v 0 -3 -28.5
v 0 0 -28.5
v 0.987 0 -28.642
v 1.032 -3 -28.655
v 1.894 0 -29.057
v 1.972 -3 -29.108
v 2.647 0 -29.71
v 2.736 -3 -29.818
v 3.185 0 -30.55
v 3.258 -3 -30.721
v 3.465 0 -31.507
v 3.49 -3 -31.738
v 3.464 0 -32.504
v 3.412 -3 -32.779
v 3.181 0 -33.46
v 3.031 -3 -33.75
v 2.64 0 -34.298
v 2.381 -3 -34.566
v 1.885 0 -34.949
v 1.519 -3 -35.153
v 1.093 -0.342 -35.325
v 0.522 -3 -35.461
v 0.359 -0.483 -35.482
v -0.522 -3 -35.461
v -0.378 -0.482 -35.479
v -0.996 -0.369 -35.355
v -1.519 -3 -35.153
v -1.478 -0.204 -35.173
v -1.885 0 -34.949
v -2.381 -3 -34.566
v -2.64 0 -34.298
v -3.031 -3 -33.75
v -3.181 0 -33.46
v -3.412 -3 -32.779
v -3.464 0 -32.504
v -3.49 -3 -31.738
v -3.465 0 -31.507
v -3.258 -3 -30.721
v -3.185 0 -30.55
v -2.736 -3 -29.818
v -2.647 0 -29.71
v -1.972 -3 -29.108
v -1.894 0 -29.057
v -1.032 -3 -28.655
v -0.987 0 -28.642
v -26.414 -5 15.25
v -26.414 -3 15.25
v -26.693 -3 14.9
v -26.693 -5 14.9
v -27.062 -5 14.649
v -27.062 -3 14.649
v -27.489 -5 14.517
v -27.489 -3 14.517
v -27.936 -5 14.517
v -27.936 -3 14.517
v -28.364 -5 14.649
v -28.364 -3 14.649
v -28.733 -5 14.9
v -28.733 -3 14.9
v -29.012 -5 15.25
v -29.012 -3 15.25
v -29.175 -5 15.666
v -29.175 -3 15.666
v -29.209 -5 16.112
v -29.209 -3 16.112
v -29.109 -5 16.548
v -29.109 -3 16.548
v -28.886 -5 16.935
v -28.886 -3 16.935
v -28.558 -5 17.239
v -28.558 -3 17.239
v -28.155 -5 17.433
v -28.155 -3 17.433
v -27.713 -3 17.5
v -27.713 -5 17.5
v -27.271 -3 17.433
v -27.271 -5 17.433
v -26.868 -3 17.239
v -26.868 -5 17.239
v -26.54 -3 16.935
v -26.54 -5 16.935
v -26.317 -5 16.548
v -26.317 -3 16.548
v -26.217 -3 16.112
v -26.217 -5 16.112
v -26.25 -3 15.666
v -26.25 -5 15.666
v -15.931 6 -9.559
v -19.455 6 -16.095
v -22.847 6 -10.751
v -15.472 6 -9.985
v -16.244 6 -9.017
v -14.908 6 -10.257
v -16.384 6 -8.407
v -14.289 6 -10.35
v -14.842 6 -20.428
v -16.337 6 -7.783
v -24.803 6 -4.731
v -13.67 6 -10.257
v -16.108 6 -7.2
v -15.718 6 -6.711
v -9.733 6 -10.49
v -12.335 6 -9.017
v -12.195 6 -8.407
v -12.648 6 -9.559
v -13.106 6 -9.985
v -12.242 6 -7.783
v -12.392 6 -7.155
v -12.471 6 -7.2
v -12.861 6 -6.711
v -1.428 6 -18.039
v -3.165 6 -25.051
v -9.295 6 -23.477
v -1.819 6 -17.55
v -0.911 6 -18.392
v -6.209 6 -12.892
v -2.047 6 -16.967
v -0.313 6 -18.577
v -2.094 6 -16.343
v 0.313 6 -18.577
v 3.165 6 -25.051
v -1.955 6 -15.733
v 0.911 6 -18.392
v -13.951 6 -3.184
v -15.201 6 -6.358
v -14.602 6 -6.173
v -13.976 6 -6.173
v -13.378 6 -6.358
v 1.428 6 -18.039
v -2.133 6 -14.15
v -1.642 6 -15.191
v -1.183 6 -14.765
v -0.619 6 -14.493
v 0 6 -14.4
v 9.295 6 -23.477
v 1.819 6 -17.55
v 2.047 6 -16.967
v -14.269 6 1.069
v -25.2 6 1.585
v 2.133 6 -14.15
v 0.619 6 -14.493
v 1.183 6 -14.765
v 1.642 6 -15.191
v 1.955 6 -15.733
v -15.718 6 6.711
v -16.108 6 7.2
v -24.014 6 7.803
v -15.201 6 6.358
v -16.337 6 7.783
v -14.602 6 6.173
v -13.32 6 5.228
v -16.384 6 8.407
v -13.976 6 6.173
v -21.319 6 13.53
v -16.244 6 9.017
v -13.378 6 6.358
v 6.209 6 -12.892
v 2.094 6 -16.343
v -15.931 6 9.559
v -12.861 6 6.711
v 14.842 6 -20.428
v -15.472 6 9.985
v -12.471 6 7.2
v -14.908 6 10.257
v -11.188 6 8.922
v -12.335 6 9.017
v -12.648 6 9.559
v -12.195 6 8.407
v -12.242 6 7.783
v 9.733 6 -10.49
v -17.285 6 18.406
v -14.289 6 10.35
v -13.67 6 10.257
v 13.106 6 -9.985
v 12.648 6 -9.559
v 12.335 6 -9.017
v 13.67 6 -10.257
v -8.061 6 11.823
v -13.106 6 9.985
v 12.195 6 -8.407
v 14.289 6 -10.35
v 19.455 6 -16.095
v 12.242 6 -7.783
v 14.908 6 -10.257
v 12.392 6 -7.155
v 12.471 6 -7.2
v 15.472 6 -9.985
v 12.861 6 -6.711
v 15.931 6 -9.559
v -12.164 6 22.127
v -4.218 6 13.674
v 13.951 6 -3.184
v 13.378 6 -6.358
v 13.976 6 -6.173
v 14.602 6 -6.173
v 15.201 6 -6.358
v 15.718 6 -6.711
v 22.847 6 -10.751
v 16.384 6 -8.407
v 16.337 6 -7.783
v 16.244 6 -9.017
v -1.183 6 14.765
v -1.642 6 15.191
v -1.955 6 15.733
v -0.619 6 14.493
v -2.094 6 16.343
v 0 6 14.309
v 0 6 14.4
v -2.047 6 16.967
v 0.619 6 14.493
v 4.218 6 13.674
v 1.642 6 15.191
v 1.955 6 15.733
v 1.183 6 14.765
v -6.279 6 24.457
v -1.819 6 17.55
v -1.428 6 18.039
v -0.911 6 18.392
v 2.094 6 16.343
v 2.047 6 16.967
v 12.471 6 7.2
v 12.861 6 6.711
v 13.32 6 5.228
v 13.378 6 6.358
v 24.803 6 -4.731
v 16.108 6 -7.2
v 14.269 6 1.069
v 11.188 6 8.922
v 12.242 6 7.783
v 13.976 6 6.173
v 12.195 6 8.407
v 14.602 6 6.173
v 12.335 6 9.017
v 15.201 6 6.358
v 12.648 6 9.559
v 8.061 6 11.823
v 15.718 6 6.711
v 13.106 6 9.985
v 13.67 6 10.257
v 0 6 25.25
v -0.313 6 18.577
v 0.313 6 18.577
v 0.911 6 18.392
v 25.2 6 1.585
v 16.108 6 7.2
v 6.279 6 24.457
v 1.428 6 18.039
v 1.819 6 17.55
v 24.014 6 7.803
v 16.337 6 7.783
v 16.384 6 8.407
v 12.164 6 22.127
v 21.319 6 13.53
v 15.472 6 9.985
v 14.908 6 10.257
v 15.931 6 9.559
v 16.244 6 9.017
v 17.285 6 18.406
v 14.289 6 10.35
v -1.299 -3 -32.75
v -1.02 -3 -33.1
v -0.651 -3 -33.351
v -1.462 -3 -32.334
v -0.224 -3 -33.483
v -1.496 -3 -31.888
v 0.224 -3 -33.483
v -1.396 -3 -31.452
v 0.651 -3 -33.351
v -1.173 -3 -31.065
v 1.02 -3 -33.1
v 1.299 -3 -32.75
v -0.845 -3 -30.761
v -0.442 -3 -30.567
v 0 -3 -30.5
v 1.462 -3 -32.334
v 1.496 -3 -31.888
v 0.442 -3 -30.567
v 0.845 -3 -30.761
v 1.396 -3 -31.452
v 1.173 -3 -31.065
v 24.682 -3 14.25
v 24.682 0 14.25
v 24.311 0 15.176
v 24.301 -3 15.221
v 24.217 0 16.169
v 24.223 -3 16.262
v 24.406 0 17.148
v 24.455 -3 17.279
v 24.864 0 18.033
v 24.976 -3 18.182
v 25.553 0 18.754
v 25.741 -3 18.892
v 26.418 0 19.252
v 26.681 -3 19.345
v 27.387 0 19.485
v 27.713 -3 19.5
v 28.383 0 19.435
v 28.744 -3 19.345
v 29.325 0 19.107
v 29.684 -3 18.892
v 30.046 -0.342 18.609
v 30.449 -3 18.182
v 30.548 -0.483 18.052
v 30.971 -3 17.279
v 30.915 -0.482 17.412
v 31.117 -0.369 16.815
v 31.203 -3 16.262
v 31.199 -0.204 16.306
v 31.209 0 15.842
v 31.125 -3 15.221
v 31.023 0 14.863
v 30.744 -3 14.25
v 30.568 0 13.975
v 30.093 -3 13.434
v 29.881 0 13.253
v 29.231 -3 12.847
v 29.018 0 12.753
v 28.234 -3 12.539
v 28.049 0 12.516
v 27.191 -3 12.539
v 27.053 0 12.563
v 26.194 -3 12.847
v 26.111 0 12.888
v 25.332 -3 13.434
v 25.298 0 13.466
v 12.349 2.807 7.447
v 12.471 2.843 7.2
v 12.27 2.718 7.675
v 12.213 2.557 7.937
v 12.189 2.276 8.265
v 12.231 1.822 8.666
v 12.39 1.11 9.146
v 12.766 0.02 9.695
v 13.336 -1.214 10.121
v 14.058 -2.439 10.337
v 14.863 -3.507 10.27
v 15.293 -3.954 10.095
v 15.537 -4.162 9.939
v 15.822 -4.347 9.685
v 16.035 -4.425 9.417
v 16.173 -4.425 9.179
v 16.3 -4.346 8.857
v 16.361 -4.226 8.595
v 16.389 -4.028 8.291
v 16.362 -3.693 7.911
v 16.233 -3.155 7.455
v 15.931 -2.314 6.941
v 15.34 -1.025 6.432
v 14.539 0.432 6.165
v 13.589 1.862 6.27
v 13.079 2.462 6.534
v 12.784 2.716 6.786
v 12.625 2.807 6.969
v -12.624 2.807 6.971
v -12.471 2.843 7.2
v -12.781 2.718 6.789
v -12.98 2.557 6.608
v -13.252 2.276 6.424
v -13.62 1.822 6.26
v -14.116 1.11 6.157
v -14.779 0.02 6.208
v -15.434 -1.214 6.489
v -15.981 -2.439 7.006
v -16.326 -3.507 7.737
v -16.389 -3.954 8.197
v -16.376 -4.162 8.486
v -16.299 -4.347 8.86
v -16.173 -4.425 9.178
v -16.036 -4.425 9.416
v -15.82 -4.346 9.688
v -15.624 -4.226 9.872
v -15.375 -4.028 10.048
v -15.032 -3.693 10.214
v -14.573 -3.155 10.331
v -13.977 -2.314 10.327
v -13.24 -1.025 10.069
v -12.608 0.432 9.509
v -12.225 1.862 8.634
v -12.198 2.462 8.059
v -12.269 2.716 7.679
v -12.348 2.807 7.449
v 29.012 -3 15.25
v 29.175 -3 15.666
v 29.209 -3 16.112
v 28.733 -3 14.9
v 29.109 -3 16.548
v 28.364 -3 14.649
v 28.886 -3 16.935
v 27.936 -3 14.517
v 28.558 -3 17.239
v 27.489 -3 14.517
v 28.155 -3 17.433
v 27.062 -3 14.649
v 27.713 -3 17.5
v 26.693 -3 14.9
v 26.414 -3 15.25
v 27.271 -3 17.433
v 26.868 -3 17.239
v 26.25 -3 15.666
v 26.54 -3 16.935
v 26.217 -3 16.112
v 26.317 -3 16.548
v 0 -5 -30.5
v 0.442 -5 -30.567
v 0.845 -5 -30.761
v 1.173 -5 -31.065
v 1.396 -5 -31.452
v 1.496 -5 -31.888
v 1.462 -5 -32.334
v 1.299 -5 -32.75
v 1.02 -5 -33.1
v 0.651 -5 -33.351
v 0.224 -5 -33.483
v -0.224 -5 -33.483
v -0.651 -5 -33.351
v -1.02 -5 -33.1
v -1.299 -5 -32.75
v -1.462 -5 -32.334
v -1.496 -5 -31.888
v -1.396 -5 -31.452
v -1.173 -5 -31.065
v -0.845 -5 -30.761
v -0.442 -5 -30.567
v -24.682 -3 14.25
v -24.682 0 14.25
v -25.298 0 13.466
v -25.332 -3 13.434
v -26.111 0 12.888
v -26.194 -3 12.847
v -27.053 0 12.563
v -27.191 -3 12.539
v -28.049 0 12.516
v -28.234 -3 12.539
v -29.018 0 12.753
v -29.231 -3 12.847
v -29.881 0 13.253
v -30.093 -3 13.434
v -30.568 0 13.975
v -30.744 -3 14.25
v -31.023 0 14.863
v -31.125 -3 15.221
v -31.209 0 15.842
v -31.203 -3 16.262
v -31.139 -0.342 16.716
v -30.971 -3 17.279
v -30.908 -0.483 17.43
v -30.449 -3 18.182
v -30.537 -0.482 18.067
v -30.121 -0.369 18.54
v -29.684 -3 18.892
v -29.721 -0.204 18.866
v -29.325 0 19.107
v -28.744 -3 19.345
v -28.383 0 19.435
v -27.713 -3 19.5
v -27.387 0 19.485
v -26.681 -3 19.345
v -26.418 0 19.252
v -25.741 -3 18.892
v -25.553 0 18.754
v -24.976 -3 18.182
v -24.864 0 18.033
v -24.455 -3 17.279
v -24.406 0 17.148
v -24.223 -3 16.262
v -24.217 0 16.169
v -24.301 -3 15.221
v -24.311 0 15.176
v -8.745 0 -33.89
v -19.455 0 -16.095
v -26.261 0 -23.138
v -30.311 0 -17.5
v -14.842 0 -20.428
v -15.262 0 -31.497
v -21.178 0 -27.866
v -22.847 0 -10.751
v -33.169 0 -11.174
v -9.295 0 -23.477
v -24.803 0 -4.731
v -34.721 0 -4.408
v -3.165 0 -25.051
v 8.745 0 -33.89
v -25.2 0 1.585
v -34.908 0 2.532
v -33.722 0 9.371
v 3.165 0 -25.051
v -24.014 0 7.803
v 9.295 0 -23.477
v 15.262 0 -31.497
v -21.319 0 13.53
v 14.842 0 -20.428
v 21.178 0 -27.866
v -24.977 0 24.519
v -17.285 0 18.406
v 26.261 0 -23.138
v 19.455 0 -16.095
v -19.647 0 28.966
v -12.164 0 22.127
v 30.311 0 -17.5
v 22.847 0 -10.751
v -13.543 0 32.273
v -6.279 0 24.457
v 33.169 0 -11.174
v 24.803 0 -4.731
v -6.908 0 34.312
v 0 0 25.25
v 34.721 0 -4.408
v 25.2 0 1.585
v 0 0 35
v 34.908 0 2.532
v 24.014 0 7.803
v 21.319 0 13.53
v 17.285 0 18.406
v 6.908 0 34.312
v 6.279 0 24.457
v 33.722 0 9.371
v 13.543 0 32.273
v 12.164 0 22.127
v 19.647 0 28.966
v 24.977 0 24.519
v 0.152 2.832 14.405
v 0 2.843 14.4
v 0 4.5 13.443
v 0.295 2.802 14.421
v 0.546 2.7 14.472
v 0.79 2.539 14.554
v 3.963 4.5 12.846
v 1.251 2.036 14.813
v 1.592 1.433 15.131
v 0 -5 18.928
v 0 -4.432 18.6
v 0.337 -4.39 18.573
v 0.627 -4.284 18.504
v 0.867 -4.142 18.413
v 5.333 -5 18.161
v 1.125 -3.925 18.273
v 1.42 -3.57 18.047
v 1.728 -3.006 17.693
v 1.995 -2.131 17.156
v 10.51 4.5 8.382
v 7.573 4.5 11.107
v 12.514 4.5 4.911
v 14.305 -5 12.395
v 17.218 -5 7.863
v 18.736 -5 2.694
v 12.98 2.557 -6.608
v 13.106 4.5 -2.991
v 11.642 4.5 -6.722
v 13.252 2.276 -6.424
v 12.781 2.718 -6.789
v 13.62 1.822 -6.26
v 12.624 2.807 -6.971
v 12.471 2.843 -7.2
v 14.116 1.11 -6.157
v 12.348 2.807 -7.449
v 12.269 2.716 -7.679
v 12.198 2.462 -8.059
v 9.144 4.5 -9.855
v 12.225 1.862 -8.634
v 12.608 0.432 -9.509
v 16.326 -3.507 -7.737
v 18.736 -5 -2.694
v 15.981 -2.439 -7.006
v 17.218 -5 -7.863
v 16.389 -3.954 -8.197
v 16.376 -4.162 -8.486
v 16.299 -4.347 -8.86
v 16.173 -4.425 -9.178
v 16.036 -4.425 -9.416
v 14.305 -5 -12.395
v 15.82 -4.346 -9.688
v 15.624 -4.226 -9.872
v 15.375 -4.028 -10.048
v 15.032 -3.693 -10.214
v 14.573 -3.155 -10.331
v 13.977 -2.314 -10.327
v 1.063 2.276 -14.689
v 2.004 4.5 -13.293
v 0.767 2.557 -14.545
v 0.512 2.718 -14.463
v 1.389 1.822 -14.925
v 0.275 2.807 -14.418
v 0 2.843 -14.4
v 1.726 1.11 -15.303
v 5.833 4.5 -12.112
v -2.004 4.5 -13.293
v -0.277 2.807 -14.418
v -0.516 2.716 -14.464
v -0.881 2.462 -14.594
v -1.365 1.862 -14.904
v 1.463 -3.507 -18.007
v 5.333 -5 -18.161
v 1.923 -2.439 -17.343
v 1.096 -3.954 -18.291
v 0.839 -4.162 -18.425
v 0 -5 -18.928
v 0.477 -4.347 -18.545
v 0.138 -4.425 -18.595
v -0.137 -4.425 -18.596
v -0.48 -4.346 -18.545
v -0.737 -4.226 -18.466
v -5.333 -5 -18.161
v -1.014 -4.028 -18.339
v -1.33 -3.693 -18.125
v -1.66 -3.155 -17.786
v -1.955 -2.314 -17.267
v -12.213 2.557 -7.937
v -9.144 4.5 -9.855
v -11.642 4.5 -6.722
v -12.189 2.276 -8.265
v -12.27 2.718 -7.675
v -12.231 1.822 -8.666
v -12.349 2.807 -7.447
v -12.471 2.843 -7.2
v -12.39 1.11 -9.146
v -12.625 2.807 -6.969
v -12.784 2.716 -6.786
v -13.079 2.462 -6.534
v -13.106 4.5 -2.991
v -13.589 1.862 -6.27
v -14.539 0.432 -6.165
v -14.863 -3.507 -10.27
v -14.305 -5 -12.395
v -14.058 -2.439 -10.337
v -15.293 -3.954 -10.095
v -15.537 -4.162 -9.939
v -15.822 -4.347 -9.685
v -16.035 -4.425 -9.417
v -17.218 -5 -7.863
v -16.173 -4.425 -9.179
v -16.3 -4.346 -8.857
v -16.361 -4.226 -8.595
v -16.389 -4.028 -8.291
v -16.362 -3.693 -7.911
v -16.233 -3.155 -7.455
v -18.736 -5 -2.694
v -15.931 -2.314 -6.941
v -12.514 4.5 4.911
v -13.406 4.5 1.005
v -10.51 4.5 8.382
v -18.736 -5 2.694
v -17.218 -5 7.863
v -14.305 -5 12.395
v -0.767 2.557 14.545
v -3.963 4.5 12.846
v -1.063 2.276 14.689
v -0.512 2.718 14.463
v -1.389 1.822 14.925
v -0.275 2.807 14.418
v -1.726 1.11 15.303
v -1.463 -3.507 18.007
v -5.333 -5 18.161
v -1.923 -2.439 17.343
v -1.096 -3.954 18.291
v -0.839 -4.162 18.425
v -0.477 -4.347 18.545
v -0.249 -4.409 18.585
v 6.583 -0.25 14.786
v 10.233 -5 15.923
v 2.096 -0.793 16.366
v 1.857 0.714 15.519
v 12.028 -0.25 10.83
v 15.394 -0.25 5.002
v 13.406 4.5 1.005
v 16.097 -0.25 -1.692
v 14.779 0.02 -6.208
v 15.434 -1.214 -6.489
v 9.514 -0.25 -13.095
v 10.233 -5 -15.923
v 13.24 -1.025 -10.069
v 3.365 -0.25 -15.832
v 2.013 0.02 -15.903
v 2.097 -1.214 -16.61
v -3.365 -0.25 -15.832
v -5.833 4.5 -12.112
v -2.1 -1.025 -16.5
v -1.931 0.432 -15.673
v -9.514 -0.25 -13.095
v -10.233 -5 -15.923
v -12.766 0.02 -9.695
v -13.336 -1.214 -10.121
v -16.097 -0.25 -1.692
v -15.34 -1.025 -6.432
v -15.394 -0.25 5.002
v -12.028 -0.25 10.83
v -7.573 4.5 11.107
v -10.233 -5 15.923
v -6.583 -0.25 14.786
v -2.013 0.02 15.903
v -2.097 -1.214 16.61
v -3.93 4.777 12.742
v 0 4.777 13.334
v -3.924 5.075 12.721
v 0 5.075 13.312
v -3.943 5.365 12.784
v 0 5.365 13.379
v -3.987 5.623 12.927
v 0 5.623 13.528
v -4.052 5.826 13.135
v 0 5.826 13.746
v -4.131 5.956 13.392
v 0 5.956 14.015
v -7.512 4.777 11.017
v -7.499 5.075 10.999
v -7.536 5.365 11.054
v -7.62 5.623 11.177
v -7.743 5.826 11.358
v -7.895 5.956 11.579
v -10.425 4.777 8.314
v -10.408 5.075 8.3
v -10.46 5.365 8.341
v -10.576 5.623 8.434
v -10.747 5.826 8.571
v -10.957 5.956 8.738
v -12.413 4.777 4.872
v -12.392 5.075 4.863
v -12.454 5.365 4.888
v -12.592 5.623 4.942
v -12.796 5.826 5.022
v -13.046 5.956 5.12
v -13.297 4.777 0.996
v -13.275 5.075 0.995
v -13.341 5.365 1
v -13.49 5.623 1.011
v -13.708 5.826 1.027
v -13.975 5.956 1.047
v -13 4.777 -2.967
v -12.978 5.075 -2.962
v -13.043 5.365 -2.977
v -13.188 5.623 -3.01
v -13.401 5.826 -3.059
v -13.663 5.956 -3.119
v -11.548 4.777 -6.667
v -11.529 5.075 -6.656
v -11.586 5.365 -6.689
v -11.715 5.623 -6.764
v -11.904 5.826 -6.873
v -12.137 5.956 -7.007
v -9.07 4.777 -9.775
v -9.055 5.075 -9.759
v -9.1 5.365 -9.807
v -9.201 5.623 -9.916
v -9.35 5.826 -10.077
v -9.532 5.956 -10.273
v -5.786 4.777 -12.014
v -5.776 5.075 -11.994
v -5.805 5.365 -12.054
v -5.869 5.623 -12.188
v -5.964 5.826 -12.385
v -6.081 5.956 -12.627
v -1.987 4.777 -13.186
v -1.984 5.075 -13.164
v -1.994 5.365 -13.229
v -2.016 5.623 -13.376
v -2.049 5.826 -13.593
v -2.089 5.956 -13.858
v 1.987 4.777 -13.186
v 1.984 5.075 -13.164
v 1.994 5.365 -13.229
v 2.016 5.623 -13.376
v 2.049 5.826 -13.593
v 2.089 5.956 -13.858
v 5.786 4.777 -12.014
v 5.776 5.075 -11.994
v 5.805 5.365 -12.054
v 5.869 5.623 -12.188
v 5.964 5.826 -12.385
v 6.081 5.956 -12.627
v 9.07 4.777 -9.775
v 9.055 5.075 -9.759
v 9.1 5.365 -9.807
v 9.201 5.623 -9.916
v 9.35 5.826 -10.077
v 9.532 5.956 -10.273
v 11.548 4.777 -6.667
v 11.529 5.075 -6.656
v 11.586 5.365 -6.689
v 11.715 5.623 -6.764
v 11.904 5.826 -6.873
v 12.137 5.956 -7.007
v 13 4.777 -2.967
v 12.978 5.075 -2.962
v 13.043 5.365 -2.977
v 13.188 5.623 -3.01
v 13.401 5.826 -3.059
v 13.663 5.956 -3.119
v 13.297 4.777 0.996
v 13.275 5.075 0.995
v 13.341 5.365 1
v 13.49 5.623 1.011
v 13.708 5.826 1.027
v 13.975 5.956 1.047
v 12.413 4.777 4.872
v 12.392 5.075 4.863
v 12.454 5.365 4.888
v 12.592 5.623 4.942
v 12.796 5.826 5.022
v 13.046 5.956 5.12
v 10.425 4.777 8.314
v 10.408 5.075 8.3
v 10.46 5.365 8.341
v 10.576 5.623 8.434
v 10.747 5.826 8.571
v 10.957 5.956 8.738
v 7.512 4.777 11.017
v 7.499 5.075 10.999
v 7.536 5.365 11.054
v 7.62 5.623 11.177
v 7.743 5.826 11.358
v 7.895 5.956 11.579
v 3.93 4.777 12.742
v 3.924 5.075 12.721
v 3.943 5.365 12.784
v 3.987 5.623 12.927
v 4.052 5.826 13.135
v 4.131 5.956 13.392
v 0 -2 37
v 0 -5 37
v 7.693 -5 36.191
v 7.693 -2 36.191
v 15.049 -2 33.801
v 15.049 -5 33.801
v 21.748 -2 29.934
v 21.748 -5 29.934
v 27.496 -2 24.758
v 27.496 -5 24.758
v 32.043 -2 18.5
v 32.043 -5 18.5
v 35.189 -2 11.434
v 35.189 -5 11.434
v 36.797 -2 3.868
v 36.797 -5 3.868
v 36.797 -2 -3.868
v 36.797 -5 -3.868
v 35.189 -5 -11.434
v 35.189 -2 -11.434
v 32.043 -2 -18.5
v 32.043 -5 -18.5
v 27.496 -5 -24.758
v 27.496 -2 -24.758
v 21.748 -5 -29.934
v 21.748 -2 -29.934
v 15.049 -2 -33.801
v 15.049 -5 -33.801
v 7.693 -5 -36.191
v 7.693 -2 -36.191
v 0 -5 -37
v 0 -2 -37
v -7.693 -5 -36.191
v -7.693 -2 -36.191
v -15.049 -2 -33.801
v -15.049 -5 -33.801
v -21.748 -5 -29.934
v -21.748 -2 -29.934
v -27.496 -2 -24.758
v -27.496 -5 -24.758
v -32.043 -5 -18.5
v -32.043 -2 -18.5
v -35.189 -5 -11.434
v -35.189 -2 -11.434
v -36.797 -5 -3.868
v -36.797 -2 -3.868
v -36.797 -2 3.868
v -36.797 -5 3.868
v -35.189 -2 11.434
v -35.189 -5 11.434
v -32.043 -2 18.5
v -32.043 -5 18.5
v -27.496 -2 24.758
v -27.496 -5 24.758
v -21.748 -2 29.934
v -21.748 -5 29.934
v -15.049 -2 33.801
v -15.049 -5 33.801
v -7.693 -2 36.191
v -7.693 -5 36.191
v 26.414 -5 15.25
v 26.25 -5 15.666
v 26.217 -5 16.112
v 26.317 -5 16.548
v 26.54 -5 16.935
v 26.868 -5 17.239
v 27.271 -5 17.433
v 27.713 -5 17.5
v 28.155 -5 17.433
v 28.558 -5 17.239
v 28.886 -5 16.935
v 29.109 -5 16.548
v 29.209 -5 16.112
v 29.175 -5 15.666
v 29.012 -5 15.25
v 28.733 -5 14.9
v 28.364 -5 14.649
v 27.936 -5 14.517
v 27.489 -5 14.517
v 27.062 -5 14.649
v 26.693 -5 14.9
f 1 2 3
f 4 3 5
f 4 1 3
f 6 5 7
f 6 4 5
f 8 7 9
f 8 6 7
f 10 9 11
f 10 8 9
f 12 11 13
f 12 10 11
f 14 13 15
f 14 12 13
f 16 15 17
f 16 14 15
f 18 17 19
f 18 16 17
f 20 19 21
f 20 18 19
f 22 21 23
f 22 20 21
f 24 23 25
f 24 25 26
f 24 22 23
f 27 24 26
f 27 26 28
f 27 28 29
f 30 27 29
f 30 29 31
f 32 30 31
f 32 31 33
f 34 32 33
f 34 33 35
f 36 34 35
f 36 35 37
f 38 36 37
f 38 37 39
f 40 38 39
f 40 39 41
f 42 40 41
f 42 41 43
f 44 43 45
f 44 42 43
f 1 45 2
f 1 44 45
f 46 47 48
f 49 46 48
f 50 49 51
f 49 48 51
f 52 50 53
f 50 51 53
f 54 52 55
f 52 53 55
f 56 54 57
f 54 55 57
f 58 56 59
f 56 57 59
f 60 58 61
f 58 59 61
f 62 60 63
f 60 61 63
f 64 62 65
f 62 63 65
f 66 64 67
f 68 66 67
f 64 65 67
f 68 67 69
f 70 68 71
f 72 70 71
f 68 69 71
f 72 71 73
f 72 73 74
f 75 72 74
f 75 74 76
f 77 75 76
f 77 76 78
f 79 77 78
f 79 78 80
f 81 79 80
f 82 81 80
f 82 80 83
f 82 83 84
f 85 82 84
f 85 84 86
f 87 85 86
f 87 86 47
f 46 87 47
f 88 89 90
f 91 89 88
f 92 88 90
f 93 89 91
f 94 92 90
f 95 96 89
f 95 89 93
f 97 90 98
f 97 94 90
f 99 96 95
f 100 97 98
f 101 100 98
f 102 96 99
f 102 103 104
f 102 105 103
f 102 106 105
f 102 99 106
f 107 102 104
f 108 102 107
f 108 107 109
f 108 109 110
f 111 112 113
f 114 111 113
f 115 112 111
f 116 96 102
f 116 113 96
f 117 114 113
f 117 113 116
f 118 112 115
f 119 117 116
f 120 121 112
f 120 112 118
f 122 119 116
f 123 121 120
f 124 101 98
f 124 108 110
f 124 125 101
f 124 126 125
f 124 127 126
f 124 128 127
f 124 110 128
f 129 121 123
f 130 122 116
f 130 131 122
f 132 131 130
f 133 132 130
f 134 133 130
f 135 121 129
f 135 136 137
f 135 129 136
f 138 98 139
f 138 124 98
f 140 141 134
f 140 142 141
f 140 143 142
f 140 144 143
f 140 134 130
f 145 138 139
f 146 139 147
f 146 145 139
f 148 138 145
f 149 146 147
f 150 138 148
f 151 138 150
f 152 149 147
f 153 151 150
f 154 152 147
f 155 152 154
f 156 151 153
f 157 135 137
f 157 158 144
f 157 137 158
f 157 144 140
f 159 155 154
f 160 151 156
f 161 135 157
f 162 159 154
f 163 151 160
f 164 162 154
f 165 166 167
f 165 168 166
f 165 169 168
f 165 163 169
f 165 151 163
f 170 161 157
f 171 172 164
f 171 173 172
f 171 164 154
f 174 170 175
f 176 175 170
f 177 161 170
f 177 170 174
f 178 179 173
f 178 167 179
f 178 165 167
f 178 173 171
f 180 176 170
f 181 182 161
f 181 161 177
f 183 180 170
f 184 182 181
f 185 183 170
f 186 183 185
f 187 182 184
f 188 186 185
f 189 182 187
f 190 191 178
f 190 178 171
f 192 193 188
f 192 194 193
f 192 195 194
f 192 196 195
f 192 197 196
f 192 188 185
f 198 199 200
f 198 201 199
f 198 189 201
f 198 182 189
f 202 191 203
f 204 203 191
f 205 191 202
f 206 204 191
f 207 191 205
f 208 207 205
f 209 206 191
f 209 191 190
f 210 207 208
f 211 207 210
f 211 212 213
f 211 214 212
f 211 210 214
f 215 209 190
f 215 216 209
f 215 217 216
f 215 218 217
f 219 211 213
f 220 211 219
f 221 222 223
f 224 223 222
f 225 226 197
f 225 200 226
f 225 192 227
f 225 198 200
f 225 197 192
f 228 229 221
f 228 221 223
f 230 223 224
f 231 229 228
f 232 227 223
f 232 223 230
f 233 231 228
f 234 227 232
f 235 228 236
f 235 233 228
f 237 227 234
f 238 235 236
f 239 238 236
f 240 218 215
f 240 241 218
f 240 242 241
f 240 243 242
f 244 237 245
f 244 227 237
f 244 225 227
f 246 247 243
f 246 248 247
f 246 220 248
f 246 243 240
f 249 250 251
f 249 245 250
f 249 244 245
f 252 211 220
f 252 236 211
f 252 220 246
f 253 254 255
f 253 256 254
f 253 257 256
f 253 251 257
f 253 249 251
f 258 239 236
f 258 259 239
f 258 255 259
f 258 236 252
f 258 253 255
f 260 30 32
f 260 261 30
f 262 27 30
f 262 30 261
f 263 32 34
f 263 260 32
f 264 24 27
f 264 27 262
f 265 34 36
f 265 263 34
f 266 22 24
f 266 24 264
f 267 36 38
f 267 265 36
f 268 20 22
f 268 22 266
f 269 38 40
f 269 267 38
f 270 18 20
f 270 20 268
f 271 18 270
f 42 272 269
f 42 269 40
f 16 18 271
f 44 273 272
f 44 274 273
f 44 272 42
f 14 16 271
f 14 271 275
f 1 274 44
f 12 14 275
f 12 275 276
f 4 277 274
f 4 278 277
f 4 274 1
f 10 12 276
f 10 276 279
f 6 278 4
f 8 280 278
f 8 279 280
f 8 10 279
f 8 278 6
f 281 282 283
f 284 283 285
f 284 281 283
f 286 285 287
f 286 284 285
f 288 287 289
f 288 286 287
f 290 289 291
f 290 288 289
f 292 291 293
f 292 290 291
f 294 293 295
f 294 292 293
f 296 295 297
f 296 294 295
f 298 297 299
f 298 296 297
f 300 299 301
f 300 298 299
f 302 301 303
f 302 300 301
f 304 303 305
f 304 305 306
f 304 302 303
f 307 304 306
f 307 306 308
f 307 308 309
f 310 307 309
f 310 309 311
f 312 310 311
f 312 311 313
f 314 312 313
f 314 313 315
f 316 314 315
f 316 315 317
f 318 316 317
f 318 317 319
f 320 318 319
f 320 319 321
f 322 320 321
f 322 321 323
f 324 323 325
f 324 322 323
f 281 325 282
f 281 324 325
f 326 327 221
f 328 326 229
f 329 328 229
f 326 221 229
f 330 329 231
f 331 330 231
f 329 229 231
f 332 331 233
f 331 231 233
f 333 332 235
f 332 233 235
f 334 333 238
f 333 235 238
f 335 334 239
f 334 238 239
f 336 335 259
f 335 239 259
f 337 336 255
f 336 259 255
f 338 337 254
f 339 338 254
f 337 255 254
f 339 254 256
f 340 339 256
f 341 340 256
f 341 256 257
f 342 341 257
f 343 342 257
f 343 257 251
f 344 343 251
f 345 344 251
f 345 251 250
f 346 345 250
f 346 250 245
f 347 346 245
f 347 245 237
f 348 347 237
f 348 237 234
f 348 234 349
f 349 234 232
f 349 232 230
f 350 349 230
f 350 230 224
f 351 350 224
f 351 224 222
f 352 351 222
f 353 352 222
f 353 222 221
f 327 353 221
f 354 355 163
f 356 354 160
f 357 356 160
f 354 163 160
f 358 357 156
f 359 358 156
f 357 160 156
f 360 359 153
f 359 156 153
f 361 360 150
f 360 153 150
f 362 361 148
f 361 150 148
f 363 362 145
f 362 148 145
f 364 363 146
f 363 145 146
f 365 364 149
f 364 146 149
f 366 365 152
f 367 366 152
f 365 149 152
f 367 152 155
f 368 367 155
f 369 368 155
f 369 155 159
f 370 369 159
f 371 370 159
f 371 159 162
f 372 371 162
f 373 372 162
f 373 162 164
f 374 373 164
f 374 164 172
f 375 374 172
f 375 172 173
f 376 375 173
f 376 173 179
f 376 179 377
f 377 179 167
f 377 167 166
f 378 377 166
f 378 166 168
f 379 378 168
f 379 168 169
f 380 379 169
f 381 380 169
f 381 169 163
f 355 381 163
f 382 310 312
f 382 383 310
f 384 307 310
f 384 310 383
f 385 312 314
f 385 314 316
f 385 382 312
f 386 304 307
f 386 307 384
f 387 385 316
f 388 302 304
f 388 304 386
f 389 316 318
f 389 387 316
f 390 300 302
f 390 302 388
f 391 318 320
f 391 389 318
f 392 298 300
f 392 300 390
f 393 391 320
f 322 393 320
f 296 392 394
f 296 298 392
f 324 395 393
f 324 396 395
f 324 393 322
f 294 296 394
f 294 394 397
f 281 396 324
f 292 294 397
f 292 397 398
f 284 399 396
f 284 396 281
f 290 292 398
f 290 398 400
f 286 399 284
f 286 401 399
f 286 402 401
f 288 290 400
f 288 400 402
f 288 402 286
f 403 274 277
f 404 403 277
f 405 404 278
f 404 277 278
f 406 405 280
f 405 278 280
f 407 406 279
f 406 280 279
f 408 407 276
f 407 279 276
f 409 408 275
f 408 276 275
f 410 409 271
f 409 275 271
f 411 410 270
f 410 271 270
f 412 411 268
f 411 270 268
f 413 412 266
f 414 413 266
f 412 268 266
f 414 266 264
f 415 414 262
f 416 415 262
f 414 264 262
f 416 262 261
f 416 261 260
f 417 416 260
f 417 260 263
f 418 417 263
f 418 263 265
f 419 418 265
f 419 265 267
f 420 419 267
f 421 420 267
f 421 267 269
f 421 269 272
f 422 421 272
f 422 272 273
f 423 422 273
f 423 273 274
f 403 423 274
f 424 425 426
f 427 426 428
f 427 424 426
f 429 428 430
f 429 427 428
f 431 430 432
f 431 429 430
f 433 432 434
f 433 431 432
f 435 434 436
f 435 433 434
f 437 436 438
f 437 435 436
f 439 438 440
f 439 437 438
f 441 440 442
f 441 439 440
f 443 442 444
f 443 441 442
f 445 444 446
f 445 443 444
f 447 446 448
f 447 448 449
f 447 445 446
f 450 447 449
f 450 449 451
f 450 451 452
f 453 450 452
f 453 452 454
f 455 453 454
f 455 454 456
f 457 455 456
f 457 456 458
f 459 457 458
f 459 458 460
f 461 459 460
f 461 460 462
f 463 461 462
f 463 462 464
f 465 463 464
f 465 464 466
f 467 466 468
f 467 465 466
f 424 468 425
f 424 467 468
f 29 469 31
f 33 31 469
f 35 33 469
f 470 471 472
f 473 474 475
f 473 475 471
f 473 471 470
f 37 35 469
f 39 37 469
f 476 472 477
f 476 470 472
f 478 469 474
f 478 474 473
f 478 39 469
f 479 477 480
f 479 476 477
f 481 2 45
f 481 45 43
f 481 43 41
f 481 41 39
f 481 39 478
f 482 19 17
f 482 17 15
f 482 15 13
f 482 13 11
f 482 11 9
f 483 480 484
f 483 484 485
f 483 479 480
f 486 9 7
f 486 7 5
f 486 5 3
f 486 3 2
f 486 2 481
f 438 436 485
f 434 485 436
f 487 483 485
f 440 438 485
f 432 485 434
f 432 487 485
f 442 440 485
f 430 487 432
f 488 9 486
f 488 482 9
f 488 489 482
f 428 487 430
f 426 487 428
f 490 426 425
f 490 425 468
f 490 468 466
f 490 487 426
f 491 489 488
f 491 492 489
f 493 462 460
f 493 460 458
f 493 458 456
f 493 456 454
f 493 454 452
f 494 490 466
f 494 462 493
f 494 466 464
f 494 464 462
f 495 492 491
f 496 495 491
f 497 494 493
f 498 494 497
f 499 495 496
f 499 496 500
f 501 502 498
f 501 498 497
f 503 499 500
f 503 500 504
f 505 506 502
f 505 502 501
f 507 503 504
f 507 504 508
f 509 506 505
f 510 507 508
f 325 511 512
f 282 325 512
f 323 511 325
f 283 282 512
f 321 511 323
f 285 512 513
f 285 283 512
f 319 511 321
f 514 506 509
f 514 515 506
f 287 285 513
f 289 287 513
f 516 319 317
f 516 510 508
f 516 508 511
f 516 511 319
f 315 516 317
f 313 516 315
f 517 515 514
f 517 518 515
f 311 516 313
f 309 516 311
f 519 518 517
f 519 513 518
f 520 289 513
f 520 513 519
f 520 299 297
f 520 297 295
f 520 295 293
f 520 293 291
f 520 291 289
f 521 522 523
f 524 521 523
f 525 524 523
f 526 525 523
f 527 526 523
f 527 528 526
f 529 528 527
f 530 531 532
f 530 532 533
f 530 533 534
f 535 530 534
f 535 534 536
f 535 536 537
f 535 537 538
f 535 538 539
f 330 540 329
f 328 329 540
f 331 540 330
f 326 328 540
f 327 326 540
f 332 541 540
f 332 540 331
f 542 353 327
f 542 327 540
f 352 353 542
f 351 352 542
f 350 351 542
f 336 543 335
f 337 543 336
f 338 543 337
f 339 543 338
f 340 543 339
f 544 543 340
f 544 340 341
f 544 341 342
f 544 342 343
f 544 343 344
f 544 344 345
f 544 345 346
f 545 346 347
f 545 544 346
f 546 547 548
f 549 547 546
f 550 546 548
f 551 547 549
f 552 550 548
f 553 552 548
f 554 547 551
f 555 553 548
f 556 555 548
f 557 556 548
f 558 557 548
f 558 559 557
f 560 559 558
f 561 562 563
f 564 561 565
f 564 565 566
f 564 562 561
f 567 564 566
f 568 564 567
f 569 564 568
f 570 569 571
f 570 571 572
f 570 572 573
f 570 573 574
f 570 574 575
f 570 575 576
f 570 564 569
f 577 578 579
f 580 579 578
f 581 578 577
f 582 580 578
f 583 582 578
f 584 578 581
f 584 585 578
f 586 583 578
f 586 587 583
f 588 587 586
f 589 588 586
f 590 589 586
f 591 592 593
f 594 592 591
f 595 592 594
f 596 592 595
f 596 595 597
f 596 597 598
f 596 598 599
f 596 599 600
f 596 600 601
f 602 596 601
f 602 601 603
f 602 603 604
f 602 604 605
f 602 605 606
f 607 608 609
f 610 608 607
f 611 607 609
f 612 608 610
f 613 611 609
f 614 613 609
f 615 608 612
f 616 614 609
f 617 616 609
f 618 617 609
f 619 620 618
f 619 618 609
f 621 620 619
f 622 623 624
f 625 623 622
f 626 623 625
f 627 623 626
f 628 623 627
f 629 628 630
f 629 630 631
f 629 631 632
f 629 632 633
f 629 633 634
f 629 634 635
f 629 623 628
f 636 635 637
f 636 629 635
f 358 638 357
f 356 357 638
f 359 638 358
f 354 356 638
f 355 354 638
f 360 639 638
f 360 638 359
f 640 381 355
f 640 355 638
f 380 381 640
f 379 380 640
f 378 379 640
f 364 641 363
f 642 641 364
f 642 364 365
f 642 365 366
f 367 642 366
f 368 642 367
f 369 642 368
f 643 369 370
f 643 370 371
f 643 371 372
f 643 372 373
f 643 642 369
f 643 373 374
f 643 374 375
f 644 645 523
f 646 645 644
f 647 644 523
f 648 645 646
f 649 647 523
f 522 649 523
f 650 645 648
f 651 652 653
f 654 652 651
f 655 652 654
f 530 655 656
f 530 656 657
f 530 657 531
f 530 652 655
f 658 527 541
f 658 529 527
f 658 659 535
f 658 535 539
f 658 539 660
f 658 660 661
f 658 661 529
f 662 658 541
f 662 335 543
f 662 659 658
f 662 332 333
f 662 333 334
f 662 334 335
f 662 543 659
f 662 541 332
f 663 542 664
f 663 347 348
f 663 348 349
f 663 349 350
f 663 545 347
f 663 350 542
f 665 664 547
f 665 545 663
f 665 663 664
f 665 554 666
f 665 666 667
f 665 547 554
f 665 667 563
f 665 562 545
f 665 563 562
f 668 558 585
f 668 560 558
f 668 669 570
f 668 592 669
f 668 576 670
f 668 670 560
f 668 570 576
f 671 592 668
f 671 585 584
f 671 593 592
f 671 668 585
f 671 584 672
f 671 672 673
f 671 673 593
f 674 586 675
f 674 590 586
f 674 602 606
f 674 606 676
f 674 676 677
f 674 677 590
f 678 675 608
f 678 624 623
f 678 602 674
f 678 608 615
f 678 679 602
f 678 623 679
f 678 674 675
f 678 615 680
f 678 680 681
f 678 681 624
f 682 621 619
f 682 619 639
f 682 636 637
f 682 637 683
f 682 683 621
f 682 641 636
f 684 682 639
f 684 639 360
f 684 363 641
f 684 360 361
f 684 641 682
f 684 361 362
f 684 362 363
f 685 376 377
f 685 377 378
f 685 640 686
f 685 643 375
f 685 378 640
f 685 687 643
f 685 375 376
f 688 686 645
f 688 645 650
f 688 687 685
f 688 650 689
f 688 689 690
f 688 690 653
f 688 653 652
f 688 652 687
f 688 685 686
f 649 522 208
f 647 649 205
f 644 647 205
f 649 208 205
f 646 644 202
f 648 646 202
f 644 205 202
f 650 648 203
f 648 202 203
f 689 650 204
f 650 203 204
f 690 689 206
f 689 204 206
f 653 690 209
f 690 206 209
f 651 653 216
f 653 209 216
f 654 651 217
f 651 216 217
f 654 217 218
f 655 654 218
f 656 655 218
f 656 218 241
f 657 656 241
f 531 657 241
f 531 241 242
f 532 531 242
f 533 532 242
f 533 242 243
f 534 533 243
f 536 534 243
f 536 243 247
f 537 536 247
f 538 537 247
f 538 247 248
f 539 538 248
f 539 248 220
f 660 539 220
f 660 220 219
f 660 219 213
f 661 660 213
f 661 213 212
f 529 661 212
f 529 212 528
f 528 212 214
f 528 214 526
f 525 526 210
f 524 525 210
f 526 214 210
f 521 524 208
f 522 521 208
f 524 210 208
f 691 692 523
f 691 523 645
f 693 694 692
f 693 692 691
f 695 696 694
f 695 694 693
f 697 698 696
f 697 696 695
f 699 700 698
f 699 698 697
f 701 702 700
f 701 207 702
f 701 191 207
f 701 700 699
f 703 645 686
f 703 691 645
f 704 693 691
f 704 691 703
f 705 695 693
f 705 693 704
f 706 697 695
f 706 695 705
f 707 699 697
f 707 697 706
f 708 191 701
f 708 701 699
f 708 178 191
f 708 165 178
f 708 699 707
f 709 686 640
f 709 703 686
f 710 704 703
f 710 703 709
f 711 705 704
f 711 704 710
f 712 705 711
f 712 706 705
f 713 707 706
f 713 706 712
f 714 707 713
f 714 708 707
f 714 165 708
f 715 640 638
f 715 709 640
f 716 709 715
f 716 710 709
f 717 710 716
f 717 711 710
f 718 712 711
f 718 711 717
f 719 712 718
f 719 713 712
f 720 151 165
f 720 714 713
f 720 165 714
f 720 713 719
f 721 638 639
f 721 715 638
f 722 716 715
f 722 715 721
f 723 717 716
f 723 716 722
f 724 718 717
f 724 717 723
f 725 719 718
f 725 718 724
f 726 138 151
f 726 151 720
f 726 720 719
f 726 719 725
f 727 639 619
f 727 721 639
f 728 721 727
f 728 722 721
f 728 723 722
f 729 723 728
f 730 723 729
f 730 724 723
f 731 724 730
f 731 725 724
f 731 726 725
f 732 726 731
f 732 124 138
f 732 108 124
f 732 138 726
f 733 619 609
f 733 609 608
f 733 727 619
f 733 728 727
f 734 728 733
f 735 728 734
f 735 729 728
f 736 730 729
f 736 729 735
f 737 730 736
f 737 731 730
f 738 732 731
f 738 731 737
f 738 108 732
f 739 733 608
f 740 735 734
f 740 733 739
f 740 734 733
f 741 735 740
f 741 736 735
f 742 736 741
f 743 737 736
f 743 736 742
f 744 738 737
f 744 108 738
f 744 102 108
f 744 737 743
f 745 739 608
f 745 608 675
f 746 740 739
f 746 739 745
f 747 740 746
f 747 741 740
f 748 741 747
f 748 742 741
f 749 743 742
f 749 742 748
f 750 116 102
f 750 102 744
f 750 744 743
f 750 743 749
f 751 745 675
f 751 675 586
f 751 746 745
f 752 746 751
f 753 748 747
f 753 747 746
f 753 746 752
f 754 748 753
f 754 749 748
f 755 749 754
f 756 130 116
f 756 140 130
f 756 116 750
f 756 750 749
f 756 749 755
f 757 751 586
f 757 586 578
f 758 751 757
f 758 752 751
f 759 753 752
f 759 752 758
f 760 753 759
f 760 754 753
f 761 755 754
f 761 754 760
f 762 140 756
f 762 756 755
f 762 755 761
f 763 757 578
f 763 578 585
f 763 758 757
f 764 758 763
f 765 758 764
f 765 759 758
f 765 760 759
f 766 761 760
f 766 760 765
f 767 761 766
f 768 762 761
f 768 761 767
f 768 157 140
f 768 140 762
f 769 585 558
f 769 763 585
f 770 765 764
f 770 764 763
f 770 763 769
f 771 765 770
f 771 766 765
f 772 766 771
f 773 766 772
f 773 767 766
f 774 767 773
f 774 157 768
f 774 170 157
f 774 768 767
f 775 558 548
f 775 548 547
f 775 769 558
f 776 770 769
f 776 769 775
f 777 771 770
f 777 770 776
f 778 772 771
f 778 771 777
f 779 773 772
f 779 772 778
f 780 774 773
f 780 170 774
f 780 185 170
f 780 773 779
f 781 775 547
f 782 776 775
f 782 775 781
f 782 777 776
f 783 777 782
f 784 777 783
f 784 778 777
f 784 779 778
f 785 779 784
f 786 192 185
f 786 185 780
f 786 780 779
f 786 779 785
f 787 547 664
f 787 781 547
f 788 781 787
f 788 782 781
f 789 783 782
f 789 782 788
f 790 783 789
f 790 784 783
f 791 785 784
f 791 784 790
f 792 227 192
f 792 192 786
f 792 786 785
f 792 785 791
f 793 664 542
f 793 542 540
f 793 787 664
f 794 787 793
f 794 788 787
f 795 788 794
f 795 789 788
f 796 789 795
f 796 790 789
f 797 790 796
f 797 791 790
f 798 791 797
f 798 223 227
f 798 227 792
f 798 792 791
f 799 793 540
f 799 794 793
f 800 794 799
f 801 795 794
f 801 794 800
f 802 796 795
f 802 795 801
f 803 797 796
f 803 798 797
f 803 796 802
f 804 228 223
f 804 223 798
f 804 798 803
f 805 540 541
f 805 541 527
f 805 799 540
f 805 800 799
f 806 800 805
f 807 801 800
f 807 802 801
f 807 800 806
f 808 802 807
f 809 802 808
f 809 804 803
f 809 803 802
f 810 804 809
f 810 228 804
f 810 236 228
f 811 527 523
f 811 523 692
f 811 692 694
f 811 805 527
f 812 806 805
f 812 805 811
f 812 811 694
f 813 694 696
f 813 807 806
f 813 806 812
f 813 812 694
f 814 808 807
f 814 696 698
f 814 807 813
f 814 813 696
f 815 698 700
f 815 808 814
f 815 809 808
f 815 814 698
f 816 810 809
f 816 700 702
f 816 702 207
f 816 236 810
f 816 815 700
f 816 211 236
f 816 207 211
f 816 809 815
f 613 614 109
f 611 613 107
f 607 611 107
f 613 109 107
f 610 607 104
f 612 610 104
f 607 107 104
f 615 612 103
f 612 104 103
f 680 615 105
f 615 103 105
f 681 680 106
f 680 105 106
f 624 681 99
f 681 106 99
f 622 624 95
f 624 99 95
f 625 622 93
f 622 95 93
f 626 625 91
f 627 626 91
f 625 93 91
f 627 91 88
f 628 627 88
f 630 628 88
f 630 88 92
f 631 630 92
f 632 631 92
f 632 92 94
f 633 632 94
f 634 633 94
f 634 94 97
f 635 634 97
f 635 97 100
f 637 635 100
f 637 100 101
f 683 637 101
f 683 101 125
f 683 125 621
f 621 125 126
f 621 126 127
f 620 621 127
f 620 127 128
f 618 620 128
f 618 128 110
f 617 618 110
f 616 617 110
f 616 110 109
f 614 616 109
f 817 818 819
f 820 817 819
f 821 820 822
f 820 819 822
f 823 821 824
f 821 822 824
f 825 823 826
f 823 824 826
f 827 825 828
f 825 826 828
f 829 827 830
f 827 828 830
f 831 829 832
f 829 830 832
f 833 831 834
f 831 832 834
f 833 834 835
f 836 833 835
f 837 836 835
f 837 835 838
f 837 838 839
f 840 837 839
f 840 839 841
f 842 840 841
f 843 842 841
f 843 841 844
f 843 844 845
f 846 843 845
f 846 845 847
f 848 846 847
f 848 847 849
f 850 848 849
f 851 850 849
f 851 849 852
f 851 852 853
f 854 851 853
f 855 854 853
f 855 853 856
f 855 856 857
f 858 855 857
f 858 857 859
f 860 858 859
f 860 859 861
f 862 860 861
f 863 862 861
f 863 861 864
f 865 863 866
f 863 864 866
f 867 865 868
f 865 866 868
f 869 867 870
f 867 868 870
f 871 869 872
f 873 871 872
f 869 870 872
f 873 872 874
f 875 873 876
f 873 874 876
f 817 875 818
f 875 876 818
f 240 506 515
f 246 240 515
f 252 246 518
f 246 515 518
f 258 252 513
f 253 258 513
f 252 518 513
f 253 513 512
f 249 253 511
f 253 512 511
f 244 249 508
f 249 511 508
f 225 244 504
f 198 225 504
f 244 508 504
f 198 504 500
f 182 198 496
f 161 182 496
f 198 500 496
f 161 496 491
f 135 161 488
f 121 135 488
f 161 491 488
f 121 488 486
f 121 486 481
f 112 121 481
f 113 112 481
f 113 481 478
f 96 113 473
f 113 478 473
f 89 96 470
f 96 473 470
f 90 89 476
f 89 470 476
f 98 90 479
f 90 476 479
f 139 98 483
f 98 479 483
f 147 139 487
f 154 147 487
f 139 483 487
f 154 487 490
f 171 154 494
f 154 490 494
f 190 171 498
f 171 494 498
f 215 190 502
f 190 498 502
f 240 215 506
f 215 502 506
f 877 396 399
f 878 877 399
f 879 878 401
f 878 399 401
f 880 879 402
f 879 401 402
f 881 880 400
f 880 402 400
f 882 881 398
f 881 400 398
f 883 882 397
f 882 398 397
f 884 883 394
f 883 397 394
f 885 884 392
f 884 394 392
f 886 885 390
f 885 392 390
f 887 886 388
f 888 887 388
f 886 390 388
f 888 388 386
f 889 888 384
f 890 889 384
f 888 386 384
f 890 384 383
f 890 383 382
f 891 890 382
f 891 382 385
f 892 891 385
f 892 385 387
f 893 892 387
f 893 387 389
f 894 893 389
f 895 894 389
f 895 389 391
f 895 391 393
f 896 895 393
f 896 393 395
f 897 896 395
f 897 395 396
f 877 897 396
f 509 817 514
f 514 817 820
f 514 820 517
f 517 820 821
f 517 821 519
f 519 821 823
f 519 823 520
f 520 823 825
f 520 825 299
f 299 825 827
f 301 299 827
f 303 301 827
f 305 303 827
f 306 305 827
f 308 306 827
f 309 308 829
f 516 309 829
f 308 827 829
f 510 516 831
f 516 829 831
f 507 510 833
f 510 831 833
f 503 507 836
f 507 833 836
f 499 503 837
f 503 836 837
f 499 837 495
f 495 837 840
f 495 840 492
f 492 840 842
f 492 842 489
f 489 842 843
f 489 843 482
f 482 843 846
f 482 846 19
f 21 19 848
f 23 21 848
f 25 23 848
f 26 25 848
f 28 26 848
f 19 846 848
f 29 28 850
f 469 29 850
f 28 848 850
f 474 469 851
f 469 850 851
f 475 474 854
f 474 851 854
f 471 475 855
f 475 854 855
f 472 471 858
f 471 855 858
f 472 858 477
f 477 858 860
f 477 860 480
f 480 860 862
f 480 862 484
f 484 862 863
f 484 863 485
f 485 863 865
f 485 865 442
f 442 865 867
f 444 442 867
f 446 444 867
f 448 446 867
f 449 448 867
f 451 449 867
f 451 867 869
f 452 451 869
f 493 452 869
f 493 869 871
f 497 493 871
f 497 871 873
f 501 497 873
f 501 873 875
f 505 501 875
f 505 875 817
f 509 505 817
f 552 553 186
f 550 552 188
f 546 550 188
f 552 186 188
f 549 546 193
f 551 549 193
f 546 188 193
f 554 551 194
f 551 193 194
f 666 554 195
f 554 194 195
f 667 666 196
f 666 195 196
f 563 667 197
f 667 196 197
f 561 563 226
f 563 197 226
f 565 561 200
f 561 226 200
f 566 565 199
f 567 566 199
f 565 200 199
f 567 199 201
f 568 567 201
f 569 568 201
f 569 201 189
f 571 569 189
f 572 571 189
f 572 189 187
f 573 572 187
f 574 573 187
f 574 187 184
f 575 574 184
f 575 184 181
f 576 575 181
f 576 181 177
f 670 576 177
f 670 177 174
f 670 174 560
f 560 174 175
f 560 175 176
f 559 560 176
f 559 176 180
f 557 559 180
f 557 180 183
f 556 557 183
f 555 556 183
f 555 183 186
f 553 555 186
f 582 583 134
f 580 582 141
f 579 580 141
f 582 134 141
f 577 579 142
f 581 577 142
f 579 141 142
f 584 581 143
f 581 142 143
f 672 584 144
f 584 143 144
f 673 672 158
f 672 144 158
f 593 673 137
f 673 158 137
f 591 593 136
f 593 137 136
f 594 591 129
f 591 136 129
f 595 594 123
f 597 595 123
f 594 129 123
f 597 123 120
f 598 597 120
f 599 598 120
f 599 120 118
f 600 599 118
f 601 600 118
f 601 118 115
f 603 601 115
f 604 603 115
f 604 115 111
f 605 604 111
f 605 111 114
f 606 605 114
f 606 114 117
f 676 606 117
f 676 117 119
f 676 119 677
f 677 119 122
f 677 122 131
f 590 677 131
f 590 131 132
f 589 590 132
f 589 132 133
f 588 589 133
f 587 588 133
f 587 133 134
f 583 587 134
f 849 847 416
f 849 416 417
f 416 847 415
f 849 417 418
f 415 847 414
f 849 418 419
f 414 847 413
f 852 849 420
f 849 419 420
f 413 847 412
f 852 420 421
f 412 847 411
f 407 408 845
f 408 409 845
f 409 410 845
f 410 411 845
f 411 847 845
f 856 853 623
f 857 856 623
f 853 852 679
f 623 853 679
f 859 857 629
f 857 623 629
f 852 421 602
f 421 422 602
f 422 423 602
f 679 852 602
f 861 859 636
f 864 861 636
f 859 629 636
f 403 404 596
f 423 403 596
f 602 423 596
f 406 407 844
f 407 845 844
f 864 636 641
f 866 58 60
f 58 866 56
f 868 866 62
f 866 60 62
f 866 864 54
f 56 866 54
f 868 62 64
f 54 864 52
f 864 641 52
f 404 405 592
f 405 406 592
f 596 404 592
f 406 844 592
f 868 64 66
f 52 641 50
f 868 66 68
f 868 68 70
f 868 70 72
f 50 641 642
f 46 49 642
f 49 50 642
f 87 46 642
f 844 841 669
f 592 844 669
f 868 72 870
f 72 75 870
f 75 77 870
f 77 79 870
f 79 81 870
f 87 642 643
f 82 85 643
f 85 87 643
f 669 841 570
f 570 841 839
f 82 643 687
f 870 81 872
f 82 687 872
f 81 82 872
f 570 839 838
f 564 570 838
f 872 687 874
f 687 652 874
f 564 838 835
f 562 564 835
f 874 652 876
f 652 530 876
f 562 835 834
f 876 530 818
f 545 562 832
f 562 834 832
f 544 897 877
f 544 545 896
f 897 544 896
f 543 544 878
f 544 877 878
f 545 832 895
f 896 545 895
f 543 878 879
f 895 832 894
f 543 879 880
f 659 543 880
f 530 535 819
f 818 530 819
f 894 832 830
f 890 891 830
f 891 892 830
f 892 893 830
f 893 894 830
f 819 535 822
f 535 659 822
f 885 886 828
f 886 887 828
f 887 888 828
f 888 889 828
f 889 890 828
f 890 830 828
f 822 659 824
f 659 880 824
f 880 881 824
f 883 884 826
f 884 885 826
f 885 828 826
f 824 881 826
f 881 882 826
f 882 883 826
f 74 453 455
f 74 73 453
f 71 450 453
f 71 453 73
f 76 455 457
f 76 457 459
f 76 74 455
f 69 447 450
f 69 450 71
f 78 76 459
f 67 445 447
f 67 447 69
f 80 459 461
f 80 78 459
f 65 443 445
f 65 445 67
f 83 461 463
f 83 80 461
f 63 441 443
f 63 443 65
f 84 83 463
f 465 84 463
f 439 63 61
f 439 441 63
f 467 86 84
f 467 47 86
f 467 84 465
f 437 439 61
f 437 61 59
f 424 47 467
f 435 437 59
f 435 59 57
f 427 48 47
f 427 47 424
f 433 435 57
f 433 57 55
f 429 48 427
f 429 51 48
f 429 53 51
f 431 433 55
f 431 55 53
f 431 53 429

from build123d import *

# Parameters (mm, degrees)
SKETCH1_R           = 25.25
SKETCH1_R_2         = 12
BOSS_EXTRUDE1_DEPTH = 6
BOSS_EXTRUDE2_START = -5
SKETCH2_R           = 37
SKETCH2_R_2         = 12
BOSS_EXTRUDE2_DEPTH = 5
SKETCH3_R           = 1.5
CUT_EXTRUDE1_DEPTH  = 53.668776329
CUT_EXTRUDE2_START  = -3
SKETCH4_R           = 3.5
CUT_EXTRUDE2_DEPTH  = 56.668776329
CIRPATTERN1_COUNT   = 3
CHAMFER1_SIZE       = 12
CHAMFER1_SIZE_2     = 6.92820323
CHAMFER2_SIZE       = 2
SKETCH5_R           = 2.1
CUT_EXTRUDE3_DEPTH  = 54.46961768
CIRPATTERN2_COUNT   = 6
FILLET1_R           = 1


with BuildPart() as part:
    # Sketch1 → Boss-Extrude1 (new body)
    with BuildSketch(Plane(origin=(0, 0, 0), x_dir=(1, 0, 0), z_dir=(0, 1, 0))):
        with Locations(Location((0, 0, 0), (0, 0, 270))):
            Circle(SKETCH1_R)
        with Locations(Location((0, 0, 0), (0, 0, 270))):
            Circle(SKETCH1_R_2, mode=Mode.SUBTRACT)
    extrude(amount=BOSS_EXTRUDE1_DEPTH)

    # Sketch2 → Boss-Extrude2 (add)
    with BuildSketch(Plane(origin=(0, 0, 0), x_dir=(1, 0, 0), z_dir=(0, 1, 0)).offset(BOSS_EXTRUDE2_START)):
        with Locations(Location((0, 0, 0), (0, 0, 270))):
            Circle(SKETCH2_R)
        with Locations(Location((0, 0, 0), (0, 0, 270))):
            Circle(SKETCH2_R_2, mode=Mode.SUBTRACT)
    extrude(amount=BOSS_EXTRUDE2_DEPTH)

    # Sketch3 → Cut-Extrude1 (cut, through all)
    with BuildSketch(Plane(origin=(0, 0, 0), x_dir=(1, 0, 0), z_dir=(0, 1, 0))):
        with Locations(Location((0, 32, 0), (0, 0, 270))):
            Circle(SKETCH3_R)
    cut_extrude1 = extrude(amount=-CUT_EXTRUDE1_DEPTH, mode=Mode.SUBTRACT)

    # Sketch4 → Cut-Extrude2 (cut)
    with BuildSketch(Plane(origin=(0, 0, 0), x_dir=(1, 0, 0), z_dir=(0, 1, 0)).offset(CUT_EXTRUDE2_START)):
        with Locations(Location((0, 32, 0), (0, 0, 270))):
            Circle(SKETCH4_R)
    cut_extrude2 = extrude(amount=CUT_EXTRUDE2_DEPTH, mode=Mode.SUBTRACT)

    # CirPattern1: Cut-Extrude1, Cut-Extrude2 ×3 about axis
    cirpattern1_axis = Axis((0, 0, 0), (0, 1, 0))
    add([cut_extrude1.rotate(cirpattern1_axis, i * 360 / CIRPATTERN1_COUNT) for i in range(1, CIRPATTERN1_COUNT)], mode=Mode.SUBTRACT)
    add([cut_extrude2.rotate(cirpattern1_axis, i * 360 / CIRPATTERN1_COUNT) for i in range(1, CIRPATTERN1_COUNT)], mode=Mode.SUBTRACT)

    # Chamfer1
    # the kernel refuses this chamfer: 12, 6.92820323 mm, written as the material it takes off along each edge
    with BuildSketch(Plane(origin=(0, -5, 0), x_dir=(0, 0, 1), z_dir=(-1, 0, 0))) as chamfer1_piece_1:
        Polygon((12, CHAMFER1_SIZE), (12 + CHAMFER1_SIZE_2, 0), (12, 0), align=None)
    revolve(axis=Axis((0, -5, 0), (0, 1, 0)), mode=Mode.SUBTRACT)

    # Chamfer2
    # the kernel refuses this chamfer: 2 mm, written as the material it takes off along each edge
    with BuildSketch(Plane(origin=(0, 0, 0), x_dir=(0, 0, 1), z_dir=(-1, 0, 0))) as chamfer2_piece_1:
        Polygon((37 - CHAMFER2_SIZE, 0), (37, -CHAMFER2_SIZE), (37, 0), align=None)
    revolve(axis=Axis((0, 0, 0), (0, 1, 0)), mode=Mode.SUBTRACT)

    # Sketch5 → Cut-Extrude3 (cut, through all)
    with BuildSketch(Plane(origin=(0, 6, 0), x_dir=(1, 0, 0), z_dir=(0, 1, 0))):
        with Locations(Location((0, 16.5, 0), (0, 0, 270))):
            Circle(SKETCH5_R)
    cut_extrude3 = extrude(amount=-CUT_EXTRUDE3_DEPTH, mode=Mode.SUBTRACT)

    # CirPattern2: Cut-Extrude3 ×6 about axis
    cirpattern2_axis = Axis((0, 0, 0), (0, 1, 0))
    for i in range(1, CIRPATTERN2_COUNT):
        add(cut_extrude3.rotate(cirpattern2_axis, i * 360 / CIRPATTERN2_COUNT), mode=Mode.SUBTRACT)

    # Fillet1
    fillet1_edges = [part.edges().sort_by_distance(p)[0] for p in [
        (0, 6, -12.577350269),
    ]]
    fillet(fillet1_edges, radius=FILLET1_R)


solid = part.part
